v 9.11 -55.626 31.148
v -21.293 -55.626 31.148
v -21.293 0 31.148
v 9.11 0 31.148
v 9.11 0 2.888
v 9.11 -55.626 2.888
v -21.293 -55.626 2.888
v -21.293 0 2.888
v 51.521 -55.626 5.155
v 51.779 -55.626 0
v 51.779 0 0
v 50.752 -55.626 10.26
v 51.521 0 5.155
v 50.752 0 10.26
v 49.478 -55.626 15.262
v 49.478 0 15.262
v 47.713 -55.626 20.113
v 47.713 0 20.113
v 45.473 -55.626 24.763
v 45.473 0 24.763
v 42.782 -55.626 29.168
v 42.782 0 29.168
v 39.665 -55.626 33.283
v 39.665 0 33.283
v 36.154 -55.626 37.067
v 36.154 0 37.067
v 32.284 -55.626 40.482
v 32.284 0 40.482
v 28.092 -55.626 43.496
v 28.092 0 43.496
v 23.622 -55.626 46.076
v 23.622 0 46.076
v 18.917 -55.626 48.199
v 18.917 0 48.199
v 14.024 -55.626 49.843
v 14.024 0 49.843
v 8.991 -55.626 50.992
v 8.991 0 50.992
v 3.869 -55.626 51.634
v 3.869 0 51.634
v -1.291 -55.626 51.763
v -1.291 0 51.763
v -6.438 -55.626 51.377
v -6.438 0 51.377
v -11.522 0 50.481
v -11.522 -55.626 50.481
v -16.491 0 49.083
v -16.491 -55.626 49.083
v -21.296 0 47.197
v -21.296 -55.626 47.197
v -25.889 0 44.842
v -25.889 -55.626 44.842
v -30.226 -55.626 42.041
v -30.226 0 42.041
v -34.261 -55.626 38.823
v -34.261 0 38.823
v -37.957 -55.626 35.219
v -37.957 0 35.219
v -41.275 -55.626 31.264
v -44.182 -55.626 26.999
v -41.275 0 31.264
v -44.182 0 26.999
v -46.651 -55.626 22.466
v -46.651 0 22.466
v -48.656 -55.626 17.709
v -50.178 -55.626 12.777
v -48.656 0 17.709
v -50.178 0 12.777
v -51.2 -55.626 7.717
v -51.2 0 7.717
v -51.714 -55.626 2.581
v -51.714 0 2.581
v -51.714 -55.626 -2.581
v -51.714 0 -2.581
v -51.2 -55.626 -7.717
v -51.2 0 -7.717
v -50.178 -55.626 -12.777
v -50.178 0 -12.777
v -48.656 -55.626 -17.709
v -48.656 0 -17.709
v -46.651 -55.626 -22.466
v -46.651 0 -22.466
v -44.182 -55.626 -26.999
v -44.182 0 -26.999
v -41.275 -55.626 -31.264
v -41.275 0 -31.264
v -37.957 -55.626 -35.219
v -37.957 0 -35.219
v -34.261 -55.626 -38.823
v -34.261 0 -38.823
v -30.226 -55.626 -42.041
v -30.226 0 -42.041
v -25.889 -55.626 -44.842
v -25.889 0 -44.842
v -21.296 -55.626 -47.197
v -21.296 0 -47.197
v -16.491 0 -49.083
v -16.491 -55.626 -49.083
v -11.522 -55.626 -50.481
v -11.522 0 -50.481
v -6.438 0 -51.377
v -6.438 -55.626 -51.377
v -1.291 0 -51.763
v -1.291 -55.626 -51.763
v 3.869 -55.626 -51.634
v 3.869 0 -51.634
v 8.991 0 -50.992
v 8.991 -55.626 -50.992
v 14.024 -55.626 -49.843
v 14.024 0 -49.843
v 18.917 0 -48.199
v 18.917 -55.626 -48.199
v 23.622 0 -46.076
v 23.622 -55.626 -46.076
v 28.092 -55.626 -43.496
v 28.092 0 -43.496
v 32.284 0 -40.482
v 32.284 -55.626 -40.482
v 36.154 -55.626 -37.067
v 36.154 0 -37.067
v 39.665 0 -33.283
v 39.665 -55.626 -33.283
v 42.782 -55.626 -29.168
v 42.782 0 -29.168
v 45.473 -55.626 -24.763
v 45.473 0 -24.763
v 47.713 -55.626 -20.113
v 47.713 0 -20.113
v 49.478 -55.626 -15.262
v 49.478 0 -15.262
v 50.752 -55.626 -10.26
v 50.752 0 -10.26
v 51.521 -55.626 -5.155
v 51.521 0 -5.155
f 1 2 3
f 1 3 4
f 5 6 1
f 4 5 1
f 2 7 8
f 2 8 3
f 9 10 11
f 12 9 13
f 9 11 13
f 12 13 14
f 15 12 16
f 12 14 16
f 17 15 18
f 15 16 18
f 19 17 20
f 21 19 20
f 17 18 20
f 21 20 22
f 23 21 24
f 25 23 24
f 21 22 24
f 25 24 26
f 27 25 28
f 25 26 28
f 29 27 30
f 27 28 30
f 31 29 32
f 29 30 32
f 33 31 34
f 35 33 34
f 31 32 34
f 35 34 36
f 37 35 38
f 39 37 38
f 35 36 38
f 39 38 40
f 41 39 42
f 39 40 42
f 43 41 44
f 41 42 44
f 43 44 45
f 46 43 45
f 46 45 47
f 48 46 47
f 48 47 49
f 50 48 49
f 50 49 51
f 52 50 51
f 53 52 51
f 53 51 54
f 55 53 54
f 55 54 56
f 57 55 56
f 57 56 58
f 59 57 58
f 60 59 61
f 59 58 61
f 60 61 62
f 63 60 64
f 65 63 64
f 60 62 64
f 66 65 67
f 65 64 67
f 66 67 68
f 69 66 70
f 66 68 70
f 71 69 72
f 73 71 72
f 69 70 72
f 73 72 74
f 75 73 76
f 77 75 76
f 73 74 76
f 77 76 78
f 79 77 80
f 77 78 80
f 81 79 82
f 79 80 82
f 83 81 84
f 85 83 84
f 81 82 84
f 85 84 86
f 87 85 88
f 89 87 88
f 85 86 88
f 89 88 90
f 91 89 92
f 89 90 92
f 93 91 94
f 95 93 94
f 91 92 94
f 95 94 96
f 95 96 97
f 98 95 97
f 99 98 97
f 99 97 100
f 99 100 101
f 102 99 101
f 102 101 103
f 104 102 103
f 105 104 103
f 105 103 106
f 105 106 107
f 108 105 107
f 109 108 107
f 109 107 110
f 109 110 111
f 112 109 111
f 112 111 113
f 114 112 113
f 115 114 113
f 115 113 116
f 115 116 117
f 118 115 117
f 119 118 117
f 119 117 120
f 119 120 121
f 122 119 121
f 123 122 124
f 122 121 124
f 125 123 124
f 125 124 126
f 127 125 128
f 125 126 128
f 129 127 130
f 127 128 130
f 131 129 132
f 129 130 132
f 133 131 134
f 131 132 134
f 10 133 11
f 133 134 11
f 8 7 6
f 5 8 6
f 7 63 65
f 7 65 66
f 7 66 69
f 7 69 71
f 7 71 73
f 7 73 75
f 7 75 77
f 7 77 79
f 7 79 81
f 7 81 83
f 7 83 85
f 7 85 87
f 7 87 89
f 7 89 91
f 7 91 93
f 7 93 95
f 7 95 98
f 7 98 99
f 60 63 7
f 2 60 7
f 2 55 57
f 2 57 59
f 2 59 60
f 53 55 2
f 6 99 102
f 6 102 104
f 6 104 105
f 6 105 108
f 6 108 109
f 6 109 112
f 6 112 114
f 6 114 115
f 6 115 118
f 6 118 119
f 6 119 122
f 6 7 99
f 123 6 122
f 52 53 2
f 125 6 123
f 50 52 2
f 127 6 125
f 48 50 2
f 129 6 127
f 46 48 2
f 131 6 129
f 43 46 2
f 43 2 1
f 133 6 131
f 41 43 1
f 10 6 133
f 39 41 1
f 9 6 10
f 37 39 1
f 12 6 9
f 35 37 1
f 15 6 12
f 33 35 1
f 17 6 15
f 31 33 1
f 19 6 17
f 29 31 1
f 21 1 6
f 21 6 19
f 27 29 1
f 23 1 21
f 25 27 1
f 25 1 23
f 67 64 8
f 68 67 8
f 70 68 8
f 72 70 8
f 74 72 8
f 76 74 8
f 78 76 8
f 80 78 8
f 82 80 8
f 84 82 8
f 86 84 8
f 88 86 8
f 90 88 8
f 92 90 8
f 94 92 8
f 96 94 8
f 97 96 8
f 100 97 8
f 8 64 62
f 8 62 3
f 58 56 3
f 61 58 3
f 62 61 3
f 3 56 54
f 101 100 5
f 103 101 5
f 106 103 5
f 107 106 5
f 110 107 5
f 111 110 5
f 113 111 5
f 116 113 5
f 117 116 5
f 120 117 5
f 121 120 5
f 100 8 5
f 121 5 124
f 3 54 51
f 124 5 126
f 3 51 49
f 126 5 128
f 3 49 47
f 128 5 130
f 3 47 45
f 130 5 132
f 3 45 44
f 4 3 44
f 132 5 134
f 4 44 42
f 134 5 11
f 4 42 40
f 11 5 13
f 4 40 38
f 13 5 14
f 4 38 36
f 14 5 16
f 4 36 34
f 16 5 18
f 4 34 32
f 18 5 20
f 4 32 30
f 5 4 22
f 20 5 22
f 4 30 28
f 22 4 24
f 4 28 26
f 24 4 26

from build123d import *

# Parameters (mm, degrees)
F0_R     = 51.778761
F1_DEPTH = 55.626
F2_W     = 30.403304
F2_H     = 28.259708
F3_DEPTH = 110.998


with BuildPart() as f1:
    # F0 (on Front) → F1 (new body)
    with BuildSketch(Plane.XZ):
        Circle(F0_R)
    extrude(amount=F1_DEPTH)

    # F2 (on face) → F3 (cut)
    with BuildSketch(Plane.XZ.offset(55.626)):
        with Locations((-6.091219, 17.017909)):
            Rectangle(F2_W, F2_H)
    extrude(amount=-F3_DEPTH, mode=Mode.SUBTRACT)


solid = f1.part
